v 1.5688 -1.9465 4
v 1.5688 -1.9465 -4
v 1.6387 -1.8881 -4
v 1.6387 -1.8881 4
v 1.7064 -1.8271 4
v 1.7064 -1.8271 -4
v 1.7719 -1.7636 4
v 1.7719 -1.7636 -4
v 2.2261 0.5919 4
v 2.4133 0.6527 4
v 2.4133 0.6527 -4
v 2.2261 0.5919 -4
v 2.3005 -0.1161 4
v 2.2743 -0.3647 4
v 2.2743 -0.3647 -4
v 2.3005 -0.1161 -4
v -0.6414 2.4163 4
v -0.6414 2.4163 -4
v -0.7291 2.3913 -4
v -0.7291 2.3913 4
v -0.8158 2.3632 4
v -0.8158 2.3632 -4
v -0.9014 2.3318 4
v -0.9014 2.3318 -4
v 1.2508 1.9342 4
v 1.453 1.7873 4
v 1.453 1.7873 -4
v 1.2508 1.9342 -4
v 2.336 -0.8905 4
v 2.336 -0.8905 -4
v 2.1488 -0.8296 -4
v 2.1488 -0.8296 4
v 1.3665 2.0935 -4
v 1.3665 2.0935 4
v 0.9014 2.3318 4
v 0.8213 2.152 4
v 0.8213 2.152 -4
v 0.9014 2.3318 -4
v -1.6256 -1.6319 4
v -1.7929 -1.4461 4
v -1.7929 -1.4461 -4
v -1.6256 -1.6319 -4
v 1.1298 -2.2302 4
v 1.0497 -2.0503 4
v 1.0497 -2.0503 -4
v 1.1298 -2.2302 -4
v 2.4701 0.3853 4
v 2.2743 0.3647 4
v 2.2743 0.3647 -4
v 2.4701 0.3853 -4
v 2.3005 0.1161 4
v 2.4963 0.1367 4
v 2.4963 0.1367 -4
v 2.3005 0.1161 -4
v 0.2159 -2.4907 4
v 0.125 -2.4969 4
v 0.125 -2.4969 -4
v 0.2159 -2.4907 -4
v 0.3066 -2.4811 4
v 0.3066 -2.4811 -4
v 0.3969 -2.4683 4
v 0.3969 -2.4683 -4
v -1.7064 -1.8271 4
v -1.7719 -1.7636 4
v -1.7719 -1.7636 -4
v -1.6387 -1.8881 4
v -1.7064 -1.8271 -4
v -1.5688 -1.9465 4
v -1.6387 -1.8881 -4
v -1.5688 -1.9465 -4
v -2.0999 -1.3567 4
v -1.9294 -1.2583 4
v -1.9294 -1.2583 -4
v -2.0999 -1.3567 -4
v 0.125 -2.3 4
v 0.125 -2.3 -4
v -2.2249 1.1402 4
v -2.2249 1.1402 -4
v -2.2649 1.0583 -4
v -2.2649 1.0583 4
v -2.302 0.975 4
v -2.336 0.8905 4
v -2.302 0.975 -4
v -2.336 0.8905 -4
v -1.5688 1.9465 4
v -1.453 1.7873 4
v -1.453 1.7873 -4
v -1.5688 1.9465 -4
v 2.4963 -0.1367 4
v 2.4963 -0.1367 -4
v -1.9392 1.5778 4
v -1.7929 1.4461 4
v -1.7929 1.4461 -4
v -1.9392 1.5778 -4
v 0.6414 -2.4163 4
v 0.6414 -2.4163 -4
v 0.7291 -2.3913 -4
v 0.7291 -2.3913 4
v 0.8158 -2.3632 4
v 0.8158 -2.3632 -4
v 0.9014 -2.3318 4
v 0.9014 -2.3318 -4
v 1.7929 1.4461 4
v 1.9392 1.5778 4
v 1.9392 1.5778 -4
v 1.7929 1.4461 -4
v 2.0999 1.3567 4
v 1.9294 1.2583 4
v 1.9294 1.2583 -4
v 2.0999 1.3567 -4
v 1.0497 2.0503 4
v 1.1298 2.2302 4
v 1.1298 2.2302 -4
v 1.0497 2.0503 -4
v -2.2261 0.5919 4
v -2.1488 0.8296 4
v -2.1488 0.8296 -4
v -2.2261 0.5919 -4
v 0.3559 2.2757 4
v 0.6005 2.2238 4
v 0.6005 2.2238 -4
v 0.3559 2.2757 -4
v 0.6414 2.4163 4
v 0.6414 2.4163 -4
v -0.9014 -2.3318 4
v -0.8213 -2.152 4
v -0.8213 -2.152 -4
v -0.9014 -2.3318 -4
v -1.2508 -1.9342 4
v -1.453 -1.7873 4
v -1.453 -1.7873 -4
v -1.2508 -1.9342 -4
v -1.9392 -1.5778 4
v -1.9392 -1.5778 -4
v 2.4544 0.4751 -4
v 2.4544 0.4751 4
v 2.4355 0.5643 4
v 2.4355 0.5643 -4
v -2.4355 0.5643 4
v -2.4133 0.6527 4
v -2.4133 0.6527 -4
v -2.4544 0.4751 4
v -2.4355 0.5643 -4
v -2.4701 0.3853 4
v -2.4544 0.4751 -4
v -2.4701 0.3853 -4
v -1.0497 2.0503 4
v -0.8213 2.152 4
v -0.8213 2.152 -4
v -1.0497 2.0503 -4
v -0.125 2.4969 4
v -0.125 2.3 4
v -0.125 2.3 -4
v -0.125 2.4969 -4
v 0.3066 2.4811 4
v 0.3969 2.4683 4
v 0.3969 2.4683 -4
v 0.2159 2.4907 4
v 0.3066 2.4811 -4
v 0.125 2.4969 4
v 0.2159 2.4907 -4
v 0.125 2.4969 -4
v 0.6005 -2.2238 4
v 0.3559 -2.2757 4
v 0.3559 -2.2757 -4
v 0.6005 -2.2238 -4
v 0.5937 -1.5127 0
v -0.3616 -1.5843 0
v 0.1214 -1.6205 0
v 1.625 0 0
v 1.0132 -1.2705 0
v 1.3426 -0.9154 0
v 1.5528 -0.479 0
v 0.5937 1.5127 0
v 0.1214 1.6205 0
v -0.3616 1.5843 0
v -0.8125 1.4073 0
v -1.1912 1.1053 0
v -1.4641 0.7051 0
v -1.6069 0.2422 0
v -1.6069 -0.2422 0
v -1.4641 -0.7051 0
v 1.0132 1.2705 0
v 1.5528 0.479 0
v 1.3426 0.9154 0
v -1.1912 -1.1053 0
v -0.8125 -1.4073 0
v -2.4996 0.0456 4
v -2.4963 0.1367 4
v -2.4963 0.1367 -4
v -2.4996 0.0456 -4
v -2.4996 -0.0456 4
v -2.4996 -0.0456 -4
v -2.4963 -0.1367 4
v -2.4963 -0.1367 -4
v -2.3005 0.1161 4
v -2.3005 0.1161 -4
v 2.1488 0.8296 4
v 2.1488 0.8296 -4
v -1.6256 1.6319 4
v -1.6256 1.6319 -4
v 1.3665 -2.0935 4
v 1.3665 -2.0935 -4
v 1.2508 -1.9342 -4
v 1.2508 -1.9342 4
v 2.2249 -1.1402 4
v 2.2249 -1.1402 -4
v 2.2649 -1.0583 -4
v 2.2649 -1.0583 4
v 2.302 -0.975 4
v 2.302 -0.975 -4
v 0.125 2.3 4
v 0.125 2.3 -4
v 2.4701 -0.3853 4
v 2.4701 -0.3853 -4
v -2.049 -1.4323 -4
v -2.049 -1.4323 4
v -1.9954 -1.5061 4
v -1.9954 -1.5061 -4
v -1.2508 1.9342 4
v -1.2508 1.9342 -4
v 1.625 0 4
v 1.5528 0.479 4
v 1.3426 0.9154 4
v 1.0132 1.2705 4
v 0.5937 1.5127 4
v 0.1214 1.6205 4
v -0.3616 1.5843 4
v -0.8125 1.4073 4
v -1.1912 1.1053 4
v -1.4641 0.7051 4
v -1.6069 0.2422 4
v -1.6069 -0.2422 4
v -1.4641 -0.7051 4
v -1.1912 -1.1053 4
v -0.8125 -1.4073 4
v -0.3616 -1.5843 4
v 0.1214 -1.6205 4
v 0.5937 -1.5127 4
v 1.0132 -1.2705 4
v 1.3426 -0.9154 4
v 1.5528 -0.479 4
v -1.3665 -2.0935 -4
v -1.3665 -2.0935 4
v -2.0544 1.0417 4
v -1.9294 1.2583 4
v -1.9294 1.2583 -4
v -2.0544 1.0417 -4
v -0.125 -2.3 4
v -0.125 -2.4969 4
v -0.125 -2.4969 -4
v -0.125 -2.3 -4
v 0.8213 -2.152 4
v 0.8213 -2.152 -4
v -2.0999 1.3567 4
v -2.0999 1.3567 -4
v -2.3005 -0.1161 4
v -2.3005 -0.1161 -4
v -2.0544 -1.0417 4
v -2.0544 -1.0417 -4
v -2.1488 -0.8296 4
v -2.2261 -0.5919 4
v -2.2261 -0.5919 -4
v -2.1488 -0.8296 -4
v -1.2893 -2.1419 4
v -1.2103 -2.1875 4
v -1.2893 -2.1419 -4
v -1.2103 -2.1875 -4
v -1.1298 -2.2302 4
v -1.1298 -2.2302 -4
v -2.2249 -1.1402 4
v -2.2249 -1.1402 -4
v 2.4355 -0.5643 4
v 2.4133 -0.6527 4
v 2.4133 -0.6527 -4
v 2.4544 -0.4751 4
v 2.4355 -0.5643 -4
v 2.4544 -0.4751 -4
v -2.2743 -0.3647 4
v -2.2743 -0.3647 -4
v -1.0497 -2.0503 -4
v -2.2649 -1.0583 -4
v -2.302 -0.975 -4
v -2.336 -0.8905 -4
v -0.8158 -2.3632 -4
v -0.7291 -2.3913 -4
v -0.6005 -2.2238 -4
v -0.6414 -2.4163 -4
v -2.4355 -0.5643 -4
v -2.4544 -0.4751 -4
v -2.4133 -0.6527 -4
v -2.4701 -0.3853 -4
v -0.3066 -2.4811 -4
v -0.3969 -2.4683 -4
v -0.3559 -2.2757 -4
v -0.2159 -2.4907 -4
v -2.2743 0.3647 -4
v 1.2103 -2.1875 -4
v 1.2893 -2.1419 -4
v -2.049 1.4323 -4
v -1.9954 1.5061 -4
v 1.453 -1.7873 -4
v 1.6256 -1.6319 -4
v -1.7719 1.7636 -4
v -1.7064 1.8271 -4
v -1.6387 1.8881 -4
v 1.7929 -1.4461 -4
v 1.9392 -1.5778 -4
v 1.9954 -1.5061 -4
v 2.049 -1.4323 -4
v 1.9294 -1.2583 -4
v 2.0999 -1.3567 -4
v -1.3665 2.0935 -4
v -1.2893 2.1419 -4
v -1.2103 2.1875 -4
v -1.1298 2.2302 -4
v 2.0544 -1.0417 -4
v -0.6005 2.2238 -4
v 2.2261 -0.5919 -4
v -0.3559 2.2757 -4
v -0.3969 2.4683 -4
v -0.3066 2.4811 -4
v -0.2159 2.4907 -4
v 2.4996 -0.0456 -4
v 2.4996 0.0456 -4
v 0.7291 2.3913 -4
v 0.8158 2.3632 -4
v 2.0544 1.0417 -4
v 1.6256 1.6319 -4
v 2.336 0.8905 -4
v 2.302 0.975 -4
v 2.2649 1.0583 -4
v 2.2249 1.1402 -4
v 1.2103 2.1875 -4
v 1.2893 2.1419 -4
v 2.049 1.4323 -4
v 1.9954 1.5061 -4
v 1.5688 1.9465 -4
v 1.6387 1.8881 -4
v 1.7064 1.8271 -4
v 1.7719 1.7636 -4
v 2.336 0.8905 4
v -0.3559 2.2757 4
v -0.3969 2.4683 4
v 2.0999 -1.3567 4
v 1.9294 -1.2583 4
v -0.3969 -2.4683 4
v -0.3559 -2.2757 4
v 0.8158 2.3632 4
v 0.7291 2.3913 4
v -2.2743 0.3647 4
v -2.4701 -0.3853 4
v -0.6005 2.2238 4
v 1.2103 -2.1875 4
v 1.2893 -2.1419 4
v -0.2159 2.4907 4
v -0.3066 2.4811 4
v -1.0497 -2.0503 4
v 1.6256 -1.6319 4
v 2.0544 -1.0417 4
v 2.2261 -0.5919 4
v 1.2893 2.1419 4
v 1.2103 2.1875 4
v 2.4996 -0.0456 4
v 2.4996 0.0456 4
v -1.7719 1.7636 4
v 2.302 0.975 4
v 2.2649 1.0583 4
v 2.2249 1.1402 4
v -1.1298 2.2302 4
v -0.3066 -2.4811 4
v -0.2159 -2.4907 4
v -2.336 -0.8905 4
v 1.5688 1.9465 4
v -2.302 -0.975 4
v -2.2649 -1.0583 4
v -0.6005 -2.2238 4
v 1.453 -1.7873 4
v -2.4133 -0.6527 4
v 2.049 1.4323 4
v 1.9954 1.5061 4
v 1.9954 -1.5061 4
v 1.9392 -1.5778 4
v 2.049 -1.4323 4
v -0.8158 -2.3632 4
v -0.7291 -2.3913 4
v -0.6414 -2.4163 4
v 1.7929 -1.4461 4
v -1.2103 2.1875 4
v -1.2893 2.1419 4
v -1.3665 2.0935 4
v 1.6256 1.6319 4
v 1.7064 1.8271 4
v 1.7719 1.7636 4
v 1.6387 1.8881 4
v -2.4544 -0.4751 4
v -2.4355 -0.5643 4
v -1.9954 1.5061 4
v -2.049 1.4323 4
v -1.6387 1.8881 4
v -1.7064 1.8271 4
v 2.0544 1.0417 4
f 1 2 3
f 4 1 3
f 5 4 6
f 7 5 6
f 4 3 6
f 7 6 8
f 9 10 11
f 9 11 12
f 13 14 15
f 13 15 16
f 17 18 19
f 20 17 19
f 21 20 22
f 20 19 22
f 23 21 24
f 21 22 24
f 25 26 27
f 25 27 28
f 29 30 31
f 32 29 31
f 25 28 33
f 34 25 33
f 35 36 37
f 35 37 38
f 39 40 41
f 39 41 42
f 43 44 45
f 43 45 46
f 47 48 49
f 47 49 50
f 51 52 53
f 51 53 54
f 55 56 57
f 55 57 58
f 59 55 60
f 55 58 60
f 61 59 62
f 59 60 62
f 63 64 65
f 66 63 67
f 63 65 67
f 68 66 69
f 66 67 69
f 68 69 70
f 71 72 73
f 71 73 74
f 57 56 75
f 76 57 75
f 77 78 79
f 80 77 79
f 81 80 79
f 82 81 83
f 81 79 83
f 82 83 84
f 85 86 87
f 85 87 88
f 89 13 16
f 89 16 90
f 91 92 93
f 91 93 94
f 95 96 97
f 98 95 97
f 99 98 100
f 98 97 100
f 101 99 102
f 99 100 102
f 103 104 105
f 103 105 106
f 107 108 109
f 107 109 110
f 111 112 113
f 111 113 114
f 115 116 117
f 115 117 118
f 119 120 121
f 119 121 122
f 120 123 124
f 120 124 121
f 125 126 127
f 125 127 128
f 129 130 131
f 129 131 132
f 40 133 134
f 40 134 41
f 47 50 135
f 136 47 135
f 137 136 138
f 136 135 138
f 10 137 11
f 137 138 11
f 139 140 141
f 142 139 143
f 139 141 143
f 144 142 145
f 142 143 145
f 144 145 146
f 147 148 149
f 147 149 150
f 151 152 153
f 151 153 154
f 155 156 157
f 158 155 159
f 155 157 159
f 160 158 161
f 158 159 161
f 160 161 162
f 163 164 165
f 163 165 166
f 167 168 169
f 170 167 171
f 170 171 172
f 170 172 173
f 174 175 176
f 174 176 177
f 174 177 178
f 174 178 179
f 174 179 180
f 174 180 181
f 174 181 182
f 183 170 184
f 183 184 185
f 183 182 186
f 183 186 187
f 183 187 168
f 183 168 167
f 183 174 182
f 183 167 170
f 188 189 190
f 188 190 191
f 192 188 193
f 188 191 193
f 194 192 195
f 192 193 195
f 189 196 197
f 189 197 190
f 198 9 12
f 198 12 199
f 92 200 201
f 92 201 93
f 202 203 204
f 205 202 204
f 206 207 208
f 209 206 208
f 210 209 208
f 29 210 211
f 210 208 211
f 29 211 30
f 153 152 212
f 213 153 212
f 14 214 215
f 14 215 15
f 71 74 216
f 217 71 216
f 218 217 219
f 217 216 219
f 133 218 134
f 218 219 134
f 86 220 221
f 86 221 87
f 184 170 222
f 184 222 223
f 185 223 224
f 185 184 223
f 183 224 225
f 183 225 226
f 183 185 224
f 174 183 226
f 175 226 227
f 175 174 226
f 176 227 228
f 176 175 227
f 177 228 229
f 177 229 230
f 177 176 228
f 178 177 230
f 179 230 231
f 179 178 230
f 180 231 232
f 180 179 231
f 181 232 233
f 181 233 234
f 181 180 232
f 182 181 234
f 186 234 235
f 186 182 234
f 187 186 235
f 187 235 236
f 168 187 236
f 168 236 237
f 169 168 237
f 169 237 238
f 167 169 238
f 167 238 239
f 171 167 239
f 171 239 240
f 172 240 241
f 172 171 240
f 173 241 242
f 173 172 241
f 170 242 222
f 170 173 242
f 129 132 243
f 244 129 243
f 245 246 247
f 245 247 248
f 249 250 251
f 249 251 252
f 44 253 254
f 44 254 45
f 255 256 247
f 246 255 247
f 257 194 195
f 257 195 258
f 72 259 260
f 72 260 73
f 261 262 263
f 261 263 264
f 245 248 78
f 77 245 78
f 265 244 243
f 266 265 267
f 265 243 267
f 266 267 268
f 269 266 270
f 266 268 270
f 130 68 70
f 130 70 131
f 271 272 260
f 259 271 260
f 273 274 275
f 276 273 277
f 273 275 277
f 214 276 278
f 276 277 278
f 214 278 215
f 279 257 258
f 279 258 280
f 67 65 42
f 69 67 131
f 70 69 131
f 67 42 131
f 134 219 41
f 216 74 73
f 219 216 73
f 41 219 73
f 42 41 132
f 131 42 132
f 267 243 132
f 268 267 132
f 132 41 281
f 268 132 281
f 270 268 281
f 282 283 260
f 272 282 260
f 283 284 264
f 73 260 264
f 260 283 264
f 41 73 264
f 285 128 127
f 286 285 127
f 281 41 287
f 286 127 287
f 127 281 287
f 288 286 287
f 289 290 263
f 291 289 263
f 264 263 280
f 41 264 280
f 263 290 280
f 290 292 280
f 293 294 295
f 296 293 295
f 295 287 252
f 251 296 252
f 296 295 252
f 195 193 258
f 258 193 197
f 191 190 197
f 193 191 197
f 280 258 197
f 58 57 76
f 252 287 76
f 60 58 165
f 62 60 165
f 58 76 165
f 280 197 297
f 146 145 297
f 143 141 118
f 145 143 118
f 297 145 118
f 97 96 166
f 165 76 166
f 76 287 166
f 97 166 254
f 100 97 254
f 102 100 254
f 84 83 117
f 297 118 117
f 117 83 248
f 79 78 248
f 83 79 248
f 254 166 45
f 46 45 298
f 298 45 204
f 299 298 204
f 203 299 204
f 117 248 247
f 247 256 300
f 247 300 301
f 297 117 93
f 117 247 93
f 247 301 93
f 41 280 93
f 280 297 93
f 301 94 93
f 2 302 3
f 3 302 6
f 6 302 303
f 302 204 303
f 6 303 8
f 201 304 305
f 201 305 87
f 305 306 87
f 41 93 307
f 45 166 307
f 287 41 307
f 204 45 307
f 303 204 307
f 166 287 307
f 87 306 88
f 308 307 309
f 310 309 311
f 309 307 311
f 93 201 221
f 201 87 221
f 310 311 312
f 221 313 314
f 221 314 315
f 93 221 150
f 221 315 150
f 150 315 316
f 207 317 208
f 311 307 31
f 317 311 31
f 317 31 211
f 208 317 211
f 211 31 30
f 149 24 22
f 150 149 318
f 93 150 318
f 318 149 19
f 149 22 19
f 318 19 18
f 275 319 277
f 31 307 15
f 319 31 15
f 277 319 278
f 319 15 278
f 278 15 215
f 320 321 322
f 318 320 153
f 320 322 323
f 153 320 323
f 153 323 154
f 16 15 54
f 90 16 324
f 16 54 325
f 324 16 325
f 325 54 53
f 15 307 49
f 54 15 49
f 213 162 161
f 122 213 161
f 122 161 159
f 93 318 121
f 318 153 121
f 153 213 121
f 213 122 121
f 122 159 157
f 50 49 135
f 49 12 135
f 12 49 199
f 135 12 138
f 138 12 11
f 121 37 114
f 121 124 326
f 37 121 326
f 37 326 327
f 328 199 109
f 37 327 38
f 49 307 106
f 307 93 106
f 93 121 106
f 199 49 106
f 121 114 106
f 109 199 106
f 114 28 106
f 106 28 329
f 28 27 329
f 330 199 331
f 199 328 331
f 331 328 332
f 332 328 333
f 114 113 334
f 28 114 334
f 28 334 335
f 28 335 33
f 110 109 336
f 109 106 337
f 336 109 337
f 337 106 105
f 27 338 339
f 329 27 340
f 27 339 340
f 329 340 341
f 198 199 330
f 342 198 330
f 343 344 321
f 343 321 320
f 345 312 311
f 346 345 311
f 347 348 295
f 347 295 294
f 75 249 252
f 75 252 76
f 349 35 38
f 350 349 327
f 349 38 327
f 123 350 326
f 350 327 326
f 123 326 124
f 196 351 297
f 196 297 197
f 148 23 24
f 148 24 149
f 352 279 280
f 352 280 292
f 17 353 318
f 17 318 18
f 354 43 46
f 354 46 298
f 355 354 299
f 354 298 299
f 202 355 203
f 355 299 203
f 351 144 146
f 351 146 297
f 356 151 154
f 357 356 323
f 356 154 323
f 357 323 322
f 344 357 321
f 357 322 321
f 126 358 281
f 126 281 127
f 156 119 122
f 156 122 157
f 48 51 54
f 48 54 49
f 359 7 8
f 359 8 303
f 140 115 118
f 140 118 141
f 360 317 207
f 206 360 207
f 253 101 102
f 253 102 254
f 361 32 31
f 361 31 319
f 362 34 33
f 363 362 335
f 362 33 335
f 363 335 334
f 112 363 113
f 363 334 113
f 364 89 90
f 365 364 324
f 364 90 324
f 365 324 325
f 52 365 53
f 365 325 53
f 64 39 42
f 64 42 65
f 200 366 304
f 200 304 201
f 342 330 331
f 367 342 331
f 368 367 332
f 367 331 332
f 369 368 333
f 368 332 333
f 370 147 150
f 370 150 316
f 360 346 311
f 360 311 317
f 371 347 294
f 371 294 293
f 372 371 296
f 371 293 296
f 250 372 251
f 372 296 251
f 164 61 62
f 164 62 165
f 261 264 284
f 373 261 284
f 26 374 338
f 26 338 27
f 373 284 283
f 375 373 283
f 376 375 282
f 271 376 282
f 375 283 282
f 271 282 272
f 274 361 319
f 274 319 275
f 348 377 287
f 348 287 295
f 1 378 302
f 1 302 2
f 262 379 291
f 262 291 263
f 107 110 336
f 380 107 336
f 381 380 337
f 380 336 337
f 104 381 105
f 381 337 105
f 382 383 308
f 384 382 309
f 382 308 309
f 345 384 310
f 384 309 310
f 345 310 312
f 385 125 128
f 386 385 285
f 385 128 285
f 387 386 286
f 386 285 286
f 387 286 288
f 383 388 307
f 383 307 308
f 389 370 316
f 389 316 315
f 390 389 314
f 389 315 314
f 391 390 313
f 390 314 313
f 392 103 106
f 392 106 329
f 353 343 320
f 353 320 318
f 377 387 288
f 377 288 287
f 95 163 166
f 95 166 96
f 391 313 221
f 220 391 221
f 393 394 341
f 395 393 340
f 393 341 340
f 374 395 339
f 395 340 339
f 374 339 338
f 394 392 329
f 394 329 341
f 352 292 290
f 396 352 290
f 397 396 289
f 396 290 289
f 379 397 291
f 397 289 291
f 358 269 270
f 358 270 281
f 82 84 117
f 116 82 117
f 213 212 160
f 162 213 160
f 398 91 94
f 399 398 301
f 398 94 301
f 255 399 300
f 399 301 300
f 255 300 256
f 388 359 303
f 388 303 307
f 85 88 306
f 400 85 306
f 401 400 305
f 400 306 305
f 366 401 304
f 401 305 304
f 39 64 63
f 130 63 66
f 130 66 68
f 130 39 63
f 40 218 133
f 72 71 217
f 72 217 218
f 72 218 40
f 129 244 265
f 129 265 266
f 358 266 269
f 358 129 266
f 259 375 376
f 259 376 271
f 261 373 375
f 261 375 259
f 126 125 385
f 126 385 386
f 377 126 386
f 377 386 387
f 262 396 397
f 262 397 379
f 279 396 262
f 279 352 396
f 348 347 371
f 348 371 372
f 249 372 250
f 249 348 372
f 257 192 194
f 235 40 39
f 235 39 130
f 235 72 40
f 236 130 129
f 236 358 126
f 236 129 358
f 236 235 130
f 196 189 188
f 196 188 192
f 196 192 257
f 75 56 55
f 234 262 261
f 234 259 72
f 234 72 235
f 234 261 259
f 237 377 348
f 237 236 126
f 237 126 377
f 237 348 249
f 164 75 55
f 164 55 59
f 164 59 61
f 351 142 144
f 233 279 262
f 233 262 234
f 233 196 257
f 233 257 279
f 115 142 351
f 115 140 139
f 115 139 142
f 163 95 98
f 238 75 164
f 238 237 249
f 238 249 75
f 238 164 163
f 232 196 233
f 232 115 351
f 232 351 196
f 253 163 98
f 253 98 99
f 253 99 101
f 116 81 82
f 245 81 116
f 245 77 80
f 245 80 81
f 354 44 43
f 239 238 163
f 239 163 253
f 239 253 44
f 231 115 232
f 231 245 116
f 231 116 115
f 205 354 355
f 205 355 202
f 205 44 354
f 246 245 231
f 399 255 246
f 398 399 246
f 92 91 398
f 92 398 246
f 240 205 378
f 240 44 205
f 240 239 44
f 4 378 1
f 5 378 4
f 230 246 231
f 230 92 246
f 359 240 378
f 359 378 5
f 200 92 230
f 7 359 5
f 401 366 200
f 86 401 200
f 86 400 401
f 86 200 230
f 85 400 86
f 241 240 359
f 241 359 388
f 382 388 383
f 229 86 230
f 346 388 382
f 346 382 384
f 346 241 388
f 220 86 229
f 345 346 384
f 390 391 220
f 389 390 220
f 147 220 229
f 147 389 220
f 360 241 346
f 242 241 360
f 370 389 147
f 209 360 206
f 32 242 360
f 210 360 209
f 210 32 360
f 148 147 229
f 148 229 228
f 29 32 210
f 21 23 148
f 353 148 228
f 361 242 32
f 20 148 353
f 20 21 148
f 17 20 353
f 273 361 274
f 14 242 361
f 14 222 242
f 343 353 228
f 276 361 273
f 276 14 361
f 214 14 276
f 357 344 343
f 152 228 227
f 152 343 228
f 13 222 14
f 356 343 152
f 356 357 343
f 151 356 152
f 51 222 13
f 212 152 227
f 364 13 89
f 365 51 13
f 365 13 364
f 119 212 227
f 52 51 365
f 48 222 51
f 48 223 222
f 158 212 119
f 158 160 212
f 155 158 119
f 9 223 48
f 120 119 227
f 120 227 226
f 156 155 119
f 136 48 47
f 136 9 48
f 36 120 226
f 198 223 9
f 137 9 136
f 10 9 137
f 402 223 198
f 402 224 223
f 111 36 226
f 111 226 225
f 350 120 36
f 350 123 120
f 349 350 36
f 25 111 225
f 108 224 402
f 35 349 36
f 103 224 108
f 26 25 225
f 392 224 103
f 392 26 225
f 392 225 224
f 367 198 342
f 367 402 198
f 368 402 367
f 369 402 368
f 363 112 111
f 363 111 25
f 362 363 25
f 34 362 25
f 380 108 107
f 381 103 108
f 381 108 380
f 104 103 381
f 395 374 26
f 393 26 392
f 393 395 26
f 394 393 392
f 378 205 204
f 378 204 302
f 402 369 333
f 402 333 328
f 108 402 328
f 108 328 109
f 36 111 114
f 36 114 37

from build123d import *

# Parameters (mm, degrees)
SKETCH1_R           = 2.5
SKETCH1_R_2         = 1.625
BOSS_EXTRUDE1_DEPTH = 4
BOSS_EXTRUDE2_START = -4
SKETCH1_2_R         = 2.5
BOSS_EXTRUDE2_DEPTH = 4
SKETCH2_W           = 0.25
SKETCH2_H           = 1
CUT_EXTRUDE1_DEPTH  = 9.746427842


with BuildPart() as part:
    # Sketch1 → Boss-Extrude1 (new body)
    with BuildSketch(Plane.XY):
        Circle(SKETCH1_R)
        Circle(SKETCH1_R_2, mode=Mode.SUBTRACT)
    extrude(amount=BOSS_EXTRUDE1_DEPTH)

    # Sketch1<2> → Boss-Extrude2 (add)
    with BuildSketch(Plane.XY.offset(BOSS_EXTRUDE2_START)):
        Circle(SKETCH1_2_R)
    extrude(amount=BOSS_EXTRUDE2_DEPTH)

    # Sketch2 → Cut-Extrude1 (cut, through all)
    with BuildSketch(Plane.XY.offset(4)):
        Polygon((0.355928439, 2.275728443), (0.56384013, 3.253876044), (0.80837703, 3.201898121), (0.600465339, 2.22375052), align=None)
        with Locations((0, 2.8)):
            Rectangle(SKETCH2_W, SKETCH2_H)
        Polygon((0.821301097, 2.151996633), (1.22803774, 3.065542091), (1.456424104, 2.96385793), (1.049687461, 2.050312472), align=None)
        Polygon((1.250778956, 1.934212244), (1.838564208, 2.743229238), (2.040818457, 2.596282925), (1.453033205, 1.787265931), align=None)
        Polygon((1.625591773, 1.631893498), (2.368736598, 2.301024104), (2.53601925, 2.115237898), (1.792874424, 1.446107291), align=None)
        Polygon((1.929358429, 1.258253175), (2.795383832, 1.758253175), (2.920383832, 1.541746825), (2.054358429, 1.041746825), align=None)
        Polygon((2.148802863, 0.829621152), (3.099859379, 1.138638146), (3.177113628, 0.900874017), (2.226057112, 0.591857023), align=None)
        Polygon((2.274334301, 0.364730702), (3.268856197, 0.469259166), (3.294988313, 0.220628692), (2.300466417, 0.116100229), align=None)
        Polygon((2.300466417, -0.116100229), (3.294988313, -0.220628692), (3.268856197, -0.469259166), (2.274334301, -0.364730702), align=None)
        Polygon((2.226057112, -0.591857023), (3.177113628, -0.900874017), (3.099859379, -1.138638146), (2.148802863, -0.829621152), align=None)
        Polygon((2.054358429, -1.041746825), (2.920383832, -1.541746825), (2.795383832, -1.758253175), (1.929358429, -1.258253175), align=None)
        Polygon((1.792874424, -1.446107291), (2.53601925, -2.115237898), (2.368736598, -2.301024104), (1.625591773, -1.631893498), align=None)
        Polygon((1.453033205, -1.787265931), (2.040818457, -2.596282925), (1.838564208, -2.743229238), (1.250778956, -1.934212244), align=None)
        Polygon((1.049687461, -2.050312472), (1.456424104, -2.96385793), (1.22803774, -3.065542091), (0.821301097, -2.151996633), align=None)
        Polygon((0.600465339, -2.22375052), (0.80837703, -3.201898121), (0.56384013, -3.253876044), (0.355928439, -2.275728443), align=None)
        with Locations((0, -2.8)):
            Rectangle(SKETCH2_W, SKETCH2_H)
        Polygon((-0.355928439, -2.275728443), (-0.56384013, -3.253876044), (-0.80837703, -3.201898121), (-0.600465339, -2.22375052), align=None)
        Polygon((-0.821301097, -2.151996633), (-1.22803774, -3.065542091), (-1.456424104, -2.96385793), (-1.049687461, -2.050312472), align=None)
        Polygon((-1.250778956, -1.934212244), (-1.838564208, -2.743229238), (-2.040818457, -2.596282925), (-1.453033205, -1.787265931), align=None)
        Polygon((-1.625591773, -1.631893498), (-2.368736598, -2.301024104), (-2.53601925, -2.115237898), (-1.792874424, -1.446107291), align=None)
        Polygon((-1.929358429, -1.258253175), (-2.795383832, -1.758253175), (-2.920383832, -1.541746825), (-2.054358429, -1.041746825), align=None)
        Polygon((-2.148802863, -0.829621152), (-3.099859379, -1.138638146), (-3.177113628, -0.900874017), (-2.226057112, -0.591857023), align=None)
        Polygon((-2.274334301, -0.364730702), (-3.268856197, -0.469259166), (-3.294988313, -0.220628692), (-2.300466417, -0.116100229), align=None)
        Polygon((-2.300466417, 0.116100229), (-3.294988313, 0.220628692), (-3.268856197, 0.469259166), (-2.274334301, 0.364730702), align=None)
        Polygon((-2.226057112, 0.591857023), (-3.177113628, 0.900874017), (-3.099859379, 1.138638146), (-2.148802863, 0.829621152), align=None)
        Polygon((-2.054358429, 1.041746825), (-2.920383832, 1.541746825), (-2.795383832, 1.758253175), (-1.929358429, 1.258253175), align=None)
        Polygon((-1.792874424, 1.446107291), (-2.53601925, 2.115237898), (-2.368736598, 2.301024104), (-1.625591773, 1.631893498), align=None)
        Polygon((-1.453033205, 1.787265931), (-2.040818457, 2.596282925), (-1.838564208, 2.743229238), (-1.250778956, 1.934212244), align=None)
        Polygon((-1.049687461, 2.050312472), (-1.456424104, 2.96385793), (-1.22803774, 3.065542091), (-0.821301097, 2.151996633), align=None)
        Polygon((-0.600465339, 2.22375052), (-0.80837703, 3.201898121), (-0.56384013, 3.253876044), (-0.355928439, 2.275728443), align=None)
    extrude(amount=-CUT_EXTRUDE1_DEPTH, mode=Mode.SUBTRACT)


solid = part.part
